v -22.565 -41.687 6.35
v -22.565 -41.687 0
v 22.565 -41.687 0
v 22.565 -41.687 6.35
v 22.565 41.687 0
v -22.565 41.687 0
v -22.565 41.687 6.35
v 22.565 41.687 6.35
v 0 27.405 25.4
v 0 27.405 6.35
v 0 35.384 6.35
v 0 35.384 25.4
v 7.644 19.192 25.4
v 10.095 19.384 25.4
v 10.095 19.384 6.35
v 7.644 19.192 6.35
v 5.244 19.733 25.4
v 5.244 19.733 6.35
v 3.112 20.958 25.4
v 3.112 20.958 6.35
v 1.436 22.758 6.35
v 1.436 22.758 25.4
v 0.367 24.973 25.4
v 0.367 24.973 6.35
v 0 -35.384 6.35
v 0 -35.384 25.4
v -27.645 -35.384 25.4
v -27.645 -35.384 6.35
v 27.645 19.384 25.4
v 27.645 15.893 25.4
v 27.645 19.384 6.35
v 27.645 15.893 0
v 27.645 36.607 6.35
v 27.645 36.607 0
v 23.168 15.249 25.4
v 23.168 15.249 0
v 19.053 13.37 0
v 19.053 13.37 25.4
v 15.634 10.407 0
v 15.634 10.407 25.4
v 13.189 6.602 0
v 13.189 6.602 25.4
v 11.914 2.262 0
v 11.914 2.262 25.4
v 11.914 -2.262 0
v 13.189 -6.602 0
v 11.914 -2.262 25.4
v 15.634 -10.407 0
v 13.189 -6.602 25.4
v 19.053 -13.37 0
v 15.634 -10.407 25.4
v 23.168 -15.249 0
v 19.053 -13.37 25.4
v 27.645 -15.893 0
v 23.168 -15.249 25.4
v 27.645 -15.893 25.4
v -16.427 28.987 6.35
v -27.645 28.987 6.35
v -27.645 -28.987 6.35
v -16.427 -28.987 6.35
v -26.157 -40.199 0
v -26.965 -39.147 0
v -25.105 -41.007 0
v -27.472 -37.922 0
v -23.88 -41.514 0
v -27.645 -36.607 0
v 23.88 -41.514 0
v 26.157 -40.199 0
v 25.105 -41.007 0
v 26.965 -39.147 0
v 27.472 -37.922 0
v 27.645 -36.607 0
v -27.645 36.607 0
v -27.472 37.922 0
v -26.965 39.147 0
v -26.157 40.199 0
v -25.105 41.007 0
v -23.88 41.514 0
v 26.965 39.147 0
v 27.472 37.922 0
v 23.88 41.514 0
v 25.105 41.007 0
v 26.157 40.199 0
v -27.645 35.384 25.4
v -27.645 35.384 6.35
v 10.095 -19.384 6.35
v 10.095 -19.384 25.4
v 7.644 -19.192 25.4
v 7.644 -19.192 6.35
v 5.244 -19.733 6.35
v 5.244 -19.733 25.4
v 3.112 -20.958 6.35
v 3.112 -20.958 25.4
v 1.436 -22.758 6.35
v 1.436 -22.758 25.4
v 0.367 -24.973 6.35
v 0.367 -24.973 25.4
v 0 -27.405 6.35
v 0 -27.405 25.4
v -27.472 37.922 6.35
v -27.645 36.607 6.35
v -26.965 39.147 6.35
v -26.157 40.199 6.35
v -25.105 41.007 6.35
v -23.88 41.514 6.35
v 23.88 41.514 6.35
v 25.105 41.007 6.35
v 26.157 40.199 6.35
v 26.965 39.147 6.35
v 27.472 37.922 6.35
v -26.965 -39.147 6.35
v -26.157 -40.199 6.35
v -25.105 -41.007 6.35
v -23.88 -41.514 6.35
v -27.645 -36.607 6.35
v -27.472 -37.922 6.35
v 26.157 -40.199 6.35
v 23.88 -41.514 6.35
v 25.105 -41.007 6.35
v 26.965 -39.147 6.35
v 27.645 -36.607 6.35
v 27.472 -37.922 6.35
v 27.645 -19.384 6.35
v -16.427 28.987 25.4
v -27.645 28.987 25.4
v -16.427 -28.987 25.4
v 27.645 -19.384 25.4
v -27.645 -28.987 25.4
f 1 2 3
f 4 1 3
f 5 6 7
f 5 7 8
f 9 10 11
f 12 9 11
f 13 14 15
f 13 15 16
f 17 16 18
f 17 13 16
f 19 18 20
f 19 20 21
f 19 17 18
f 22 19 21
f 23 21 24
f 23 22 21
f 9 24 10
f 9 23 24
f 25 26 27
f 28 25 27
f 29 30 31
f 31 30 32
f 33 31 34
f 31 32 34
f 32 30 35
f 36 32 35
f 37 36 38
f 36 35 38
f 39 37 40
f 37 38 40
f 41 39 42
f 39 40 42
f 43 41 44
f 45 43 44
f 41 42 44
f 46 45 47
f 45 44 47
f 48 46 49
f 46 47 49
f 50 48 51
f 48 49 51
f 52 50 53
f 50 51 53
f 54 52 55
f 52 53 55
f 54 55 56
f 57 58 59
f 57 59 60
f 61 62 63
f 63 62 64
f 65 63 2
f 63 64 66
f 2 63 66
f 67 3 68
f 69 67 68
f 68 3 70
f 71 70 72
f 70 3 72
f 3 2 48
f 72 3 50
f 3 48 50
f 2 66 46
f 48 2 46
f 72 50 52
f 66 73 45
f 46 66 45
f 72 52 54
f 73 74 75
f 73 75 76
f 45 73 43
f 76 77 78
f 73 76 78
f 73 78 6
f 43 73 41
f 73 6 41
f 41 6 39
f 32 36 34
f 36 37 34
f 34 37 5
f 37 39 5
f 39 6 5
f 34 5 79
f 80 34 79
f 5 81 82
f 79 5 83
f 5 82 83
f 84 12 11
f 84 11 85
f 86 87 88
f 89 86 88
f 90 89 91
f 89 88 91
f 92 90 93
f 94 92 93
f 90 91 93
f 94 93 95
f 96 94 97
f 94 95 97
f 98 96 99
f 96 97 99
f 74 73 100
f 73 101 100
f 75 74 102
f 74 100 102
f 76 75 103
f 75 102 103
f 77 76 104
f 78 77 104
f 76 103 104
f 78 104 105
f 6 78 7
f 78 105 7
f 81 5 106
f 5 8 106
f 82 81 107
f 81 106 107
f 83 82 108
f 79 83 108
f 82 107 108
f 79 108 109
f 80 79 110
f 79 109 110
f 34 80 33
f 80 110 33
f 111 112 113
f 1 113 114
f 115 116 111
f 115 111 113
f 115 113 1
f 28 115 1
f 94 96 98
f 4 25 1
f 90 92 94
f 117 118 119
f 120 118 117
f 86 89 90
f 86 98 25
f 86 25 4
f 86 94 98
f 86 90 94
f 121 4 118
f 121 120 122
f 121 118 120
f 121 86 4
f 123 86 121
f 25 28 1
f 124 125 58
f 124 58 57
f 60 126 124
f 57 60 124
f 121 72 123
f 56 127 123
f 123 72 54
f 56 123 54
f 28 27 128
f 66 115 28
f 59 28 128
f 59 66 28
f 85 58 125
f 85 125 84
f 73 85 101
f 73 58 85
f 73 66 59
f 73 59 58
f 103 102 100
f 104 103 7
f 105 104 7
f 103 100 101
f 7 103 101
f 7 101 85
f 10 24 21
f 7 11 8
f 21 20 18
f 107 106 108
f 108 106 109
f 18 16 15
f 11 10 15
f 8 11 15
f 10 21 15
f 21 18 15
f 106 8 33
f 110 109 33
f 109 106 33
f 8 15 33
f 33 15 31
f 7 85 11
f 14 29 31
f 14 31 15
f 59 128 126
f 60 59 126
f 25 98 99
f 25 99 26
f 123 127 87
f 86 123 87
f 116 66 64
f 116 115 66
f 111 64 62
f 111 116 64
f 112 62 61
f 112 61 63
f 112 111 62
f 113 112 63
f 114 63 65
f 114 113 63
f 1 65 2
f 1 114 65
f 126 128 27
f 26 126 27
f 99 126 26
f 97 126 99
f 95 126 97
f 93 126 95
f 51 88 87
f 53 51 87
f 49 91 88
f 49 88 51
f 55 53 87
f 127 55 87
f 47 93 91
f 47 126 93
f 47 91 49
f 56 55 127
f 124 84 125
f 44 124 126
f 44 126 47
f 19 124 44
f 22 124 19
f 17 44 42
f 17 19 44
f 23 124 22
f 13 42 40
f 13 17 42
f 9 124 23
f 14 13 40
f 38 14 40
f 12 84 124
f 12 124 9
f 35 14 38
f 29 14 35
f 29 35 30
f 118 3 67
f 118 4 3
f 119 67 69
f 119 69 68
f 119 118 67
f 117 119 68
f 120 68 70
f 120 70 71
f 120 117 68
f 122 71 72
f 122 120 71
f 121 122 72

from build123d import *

# Parameters (mm, degrees)
F0_W     = 55.290274322
F0_H     = 83.3742246032
F1_DEPTH = 25.4
F2_R     = 15.8926372782
F3_DEPTH = 25.401
F4_W     = 11.2183341355
F4_H     = 57.9742246032
F5_DEPTH = 19.05
F7_DEPTH = 19.05
F8_R     = 5.08


# Not quite as in the source:
# - a pattern or mirror of a feature is missing from the dataset's text; its kind, count and spacing are read off the source's solid


with BuildPart() as f1:
    # F0 (on Top) → F1 (new body)
    with BuildSketch(Plane.XY):
        Rectangle(F0_W, F0_H)
    extrude(amount=F1_DEPTH)

    # F2 (on face) → F3 (cut, through all)
    with BuildSketch(Plane.XY.offset(25.4)):
        with Locations((27.645137161, 0)):
            Circle(F2_R)
    extrude(amount=-F3_DEPTH, mode=Mode.SUBTRACT)

    # F4 (on face) → F5 (cut)
    with BuildSketch(Plane.XY.offset(25.4)):
        with Locations((-22.0359700932, 0)):
            Rectangle(F4_W, F4_H)
    extrude(amount=-F5_DEPTH, mode=Mode.SUBTRACT)

    # F6 (on face) → F7 (cut)
    with BuildSketch(Plane.XY.offset(25.4)):
        with BuildLine():
            Line((27.645137161, -41.6871123016), (27.645137161, -19.3835441023))
            Line((27.645137161, -19.3835441023), (10.0954379886, -19.3835441023))
            ThreePointArc((10.0954379886, -19.3835441023), (3.1118668584, -20.9577512479), (0, -27.4048186839))
            Line((0, -27.4048186839), (0, -35.3843905032))
            Line((0, -35.3843905032), (-27.645137161, -35.3843905032))
            Line((-27.645137161, -35.3843905032), (-27.645137161, -41.6871123016))
            Line((-27.645137161, -41.6871123016), (27.645137161, -41.6871123016))
        make_face()
    f7 = extrude(amount=-F7_DEPTH, mode=Mode.SUBTRACT)

    # F7_copies: F7 across plane
    add(f7.mirror(Plane.ZX), mode=Mode.SUBTRACT)

    # F8
    f8_edges = [f1.edges().sort_by_distance(p)[0] for p in [
        (27.645137, -41.687112, 3.175),
        (27.645137, 41.687112, 3.175),
        (-27.645137, 41.687112, 3.175),
        (-27.645137, -41.687112, 3.175),
    ]]
    fillet(f8_edges, radius=F8_R)


solid = f1.part
